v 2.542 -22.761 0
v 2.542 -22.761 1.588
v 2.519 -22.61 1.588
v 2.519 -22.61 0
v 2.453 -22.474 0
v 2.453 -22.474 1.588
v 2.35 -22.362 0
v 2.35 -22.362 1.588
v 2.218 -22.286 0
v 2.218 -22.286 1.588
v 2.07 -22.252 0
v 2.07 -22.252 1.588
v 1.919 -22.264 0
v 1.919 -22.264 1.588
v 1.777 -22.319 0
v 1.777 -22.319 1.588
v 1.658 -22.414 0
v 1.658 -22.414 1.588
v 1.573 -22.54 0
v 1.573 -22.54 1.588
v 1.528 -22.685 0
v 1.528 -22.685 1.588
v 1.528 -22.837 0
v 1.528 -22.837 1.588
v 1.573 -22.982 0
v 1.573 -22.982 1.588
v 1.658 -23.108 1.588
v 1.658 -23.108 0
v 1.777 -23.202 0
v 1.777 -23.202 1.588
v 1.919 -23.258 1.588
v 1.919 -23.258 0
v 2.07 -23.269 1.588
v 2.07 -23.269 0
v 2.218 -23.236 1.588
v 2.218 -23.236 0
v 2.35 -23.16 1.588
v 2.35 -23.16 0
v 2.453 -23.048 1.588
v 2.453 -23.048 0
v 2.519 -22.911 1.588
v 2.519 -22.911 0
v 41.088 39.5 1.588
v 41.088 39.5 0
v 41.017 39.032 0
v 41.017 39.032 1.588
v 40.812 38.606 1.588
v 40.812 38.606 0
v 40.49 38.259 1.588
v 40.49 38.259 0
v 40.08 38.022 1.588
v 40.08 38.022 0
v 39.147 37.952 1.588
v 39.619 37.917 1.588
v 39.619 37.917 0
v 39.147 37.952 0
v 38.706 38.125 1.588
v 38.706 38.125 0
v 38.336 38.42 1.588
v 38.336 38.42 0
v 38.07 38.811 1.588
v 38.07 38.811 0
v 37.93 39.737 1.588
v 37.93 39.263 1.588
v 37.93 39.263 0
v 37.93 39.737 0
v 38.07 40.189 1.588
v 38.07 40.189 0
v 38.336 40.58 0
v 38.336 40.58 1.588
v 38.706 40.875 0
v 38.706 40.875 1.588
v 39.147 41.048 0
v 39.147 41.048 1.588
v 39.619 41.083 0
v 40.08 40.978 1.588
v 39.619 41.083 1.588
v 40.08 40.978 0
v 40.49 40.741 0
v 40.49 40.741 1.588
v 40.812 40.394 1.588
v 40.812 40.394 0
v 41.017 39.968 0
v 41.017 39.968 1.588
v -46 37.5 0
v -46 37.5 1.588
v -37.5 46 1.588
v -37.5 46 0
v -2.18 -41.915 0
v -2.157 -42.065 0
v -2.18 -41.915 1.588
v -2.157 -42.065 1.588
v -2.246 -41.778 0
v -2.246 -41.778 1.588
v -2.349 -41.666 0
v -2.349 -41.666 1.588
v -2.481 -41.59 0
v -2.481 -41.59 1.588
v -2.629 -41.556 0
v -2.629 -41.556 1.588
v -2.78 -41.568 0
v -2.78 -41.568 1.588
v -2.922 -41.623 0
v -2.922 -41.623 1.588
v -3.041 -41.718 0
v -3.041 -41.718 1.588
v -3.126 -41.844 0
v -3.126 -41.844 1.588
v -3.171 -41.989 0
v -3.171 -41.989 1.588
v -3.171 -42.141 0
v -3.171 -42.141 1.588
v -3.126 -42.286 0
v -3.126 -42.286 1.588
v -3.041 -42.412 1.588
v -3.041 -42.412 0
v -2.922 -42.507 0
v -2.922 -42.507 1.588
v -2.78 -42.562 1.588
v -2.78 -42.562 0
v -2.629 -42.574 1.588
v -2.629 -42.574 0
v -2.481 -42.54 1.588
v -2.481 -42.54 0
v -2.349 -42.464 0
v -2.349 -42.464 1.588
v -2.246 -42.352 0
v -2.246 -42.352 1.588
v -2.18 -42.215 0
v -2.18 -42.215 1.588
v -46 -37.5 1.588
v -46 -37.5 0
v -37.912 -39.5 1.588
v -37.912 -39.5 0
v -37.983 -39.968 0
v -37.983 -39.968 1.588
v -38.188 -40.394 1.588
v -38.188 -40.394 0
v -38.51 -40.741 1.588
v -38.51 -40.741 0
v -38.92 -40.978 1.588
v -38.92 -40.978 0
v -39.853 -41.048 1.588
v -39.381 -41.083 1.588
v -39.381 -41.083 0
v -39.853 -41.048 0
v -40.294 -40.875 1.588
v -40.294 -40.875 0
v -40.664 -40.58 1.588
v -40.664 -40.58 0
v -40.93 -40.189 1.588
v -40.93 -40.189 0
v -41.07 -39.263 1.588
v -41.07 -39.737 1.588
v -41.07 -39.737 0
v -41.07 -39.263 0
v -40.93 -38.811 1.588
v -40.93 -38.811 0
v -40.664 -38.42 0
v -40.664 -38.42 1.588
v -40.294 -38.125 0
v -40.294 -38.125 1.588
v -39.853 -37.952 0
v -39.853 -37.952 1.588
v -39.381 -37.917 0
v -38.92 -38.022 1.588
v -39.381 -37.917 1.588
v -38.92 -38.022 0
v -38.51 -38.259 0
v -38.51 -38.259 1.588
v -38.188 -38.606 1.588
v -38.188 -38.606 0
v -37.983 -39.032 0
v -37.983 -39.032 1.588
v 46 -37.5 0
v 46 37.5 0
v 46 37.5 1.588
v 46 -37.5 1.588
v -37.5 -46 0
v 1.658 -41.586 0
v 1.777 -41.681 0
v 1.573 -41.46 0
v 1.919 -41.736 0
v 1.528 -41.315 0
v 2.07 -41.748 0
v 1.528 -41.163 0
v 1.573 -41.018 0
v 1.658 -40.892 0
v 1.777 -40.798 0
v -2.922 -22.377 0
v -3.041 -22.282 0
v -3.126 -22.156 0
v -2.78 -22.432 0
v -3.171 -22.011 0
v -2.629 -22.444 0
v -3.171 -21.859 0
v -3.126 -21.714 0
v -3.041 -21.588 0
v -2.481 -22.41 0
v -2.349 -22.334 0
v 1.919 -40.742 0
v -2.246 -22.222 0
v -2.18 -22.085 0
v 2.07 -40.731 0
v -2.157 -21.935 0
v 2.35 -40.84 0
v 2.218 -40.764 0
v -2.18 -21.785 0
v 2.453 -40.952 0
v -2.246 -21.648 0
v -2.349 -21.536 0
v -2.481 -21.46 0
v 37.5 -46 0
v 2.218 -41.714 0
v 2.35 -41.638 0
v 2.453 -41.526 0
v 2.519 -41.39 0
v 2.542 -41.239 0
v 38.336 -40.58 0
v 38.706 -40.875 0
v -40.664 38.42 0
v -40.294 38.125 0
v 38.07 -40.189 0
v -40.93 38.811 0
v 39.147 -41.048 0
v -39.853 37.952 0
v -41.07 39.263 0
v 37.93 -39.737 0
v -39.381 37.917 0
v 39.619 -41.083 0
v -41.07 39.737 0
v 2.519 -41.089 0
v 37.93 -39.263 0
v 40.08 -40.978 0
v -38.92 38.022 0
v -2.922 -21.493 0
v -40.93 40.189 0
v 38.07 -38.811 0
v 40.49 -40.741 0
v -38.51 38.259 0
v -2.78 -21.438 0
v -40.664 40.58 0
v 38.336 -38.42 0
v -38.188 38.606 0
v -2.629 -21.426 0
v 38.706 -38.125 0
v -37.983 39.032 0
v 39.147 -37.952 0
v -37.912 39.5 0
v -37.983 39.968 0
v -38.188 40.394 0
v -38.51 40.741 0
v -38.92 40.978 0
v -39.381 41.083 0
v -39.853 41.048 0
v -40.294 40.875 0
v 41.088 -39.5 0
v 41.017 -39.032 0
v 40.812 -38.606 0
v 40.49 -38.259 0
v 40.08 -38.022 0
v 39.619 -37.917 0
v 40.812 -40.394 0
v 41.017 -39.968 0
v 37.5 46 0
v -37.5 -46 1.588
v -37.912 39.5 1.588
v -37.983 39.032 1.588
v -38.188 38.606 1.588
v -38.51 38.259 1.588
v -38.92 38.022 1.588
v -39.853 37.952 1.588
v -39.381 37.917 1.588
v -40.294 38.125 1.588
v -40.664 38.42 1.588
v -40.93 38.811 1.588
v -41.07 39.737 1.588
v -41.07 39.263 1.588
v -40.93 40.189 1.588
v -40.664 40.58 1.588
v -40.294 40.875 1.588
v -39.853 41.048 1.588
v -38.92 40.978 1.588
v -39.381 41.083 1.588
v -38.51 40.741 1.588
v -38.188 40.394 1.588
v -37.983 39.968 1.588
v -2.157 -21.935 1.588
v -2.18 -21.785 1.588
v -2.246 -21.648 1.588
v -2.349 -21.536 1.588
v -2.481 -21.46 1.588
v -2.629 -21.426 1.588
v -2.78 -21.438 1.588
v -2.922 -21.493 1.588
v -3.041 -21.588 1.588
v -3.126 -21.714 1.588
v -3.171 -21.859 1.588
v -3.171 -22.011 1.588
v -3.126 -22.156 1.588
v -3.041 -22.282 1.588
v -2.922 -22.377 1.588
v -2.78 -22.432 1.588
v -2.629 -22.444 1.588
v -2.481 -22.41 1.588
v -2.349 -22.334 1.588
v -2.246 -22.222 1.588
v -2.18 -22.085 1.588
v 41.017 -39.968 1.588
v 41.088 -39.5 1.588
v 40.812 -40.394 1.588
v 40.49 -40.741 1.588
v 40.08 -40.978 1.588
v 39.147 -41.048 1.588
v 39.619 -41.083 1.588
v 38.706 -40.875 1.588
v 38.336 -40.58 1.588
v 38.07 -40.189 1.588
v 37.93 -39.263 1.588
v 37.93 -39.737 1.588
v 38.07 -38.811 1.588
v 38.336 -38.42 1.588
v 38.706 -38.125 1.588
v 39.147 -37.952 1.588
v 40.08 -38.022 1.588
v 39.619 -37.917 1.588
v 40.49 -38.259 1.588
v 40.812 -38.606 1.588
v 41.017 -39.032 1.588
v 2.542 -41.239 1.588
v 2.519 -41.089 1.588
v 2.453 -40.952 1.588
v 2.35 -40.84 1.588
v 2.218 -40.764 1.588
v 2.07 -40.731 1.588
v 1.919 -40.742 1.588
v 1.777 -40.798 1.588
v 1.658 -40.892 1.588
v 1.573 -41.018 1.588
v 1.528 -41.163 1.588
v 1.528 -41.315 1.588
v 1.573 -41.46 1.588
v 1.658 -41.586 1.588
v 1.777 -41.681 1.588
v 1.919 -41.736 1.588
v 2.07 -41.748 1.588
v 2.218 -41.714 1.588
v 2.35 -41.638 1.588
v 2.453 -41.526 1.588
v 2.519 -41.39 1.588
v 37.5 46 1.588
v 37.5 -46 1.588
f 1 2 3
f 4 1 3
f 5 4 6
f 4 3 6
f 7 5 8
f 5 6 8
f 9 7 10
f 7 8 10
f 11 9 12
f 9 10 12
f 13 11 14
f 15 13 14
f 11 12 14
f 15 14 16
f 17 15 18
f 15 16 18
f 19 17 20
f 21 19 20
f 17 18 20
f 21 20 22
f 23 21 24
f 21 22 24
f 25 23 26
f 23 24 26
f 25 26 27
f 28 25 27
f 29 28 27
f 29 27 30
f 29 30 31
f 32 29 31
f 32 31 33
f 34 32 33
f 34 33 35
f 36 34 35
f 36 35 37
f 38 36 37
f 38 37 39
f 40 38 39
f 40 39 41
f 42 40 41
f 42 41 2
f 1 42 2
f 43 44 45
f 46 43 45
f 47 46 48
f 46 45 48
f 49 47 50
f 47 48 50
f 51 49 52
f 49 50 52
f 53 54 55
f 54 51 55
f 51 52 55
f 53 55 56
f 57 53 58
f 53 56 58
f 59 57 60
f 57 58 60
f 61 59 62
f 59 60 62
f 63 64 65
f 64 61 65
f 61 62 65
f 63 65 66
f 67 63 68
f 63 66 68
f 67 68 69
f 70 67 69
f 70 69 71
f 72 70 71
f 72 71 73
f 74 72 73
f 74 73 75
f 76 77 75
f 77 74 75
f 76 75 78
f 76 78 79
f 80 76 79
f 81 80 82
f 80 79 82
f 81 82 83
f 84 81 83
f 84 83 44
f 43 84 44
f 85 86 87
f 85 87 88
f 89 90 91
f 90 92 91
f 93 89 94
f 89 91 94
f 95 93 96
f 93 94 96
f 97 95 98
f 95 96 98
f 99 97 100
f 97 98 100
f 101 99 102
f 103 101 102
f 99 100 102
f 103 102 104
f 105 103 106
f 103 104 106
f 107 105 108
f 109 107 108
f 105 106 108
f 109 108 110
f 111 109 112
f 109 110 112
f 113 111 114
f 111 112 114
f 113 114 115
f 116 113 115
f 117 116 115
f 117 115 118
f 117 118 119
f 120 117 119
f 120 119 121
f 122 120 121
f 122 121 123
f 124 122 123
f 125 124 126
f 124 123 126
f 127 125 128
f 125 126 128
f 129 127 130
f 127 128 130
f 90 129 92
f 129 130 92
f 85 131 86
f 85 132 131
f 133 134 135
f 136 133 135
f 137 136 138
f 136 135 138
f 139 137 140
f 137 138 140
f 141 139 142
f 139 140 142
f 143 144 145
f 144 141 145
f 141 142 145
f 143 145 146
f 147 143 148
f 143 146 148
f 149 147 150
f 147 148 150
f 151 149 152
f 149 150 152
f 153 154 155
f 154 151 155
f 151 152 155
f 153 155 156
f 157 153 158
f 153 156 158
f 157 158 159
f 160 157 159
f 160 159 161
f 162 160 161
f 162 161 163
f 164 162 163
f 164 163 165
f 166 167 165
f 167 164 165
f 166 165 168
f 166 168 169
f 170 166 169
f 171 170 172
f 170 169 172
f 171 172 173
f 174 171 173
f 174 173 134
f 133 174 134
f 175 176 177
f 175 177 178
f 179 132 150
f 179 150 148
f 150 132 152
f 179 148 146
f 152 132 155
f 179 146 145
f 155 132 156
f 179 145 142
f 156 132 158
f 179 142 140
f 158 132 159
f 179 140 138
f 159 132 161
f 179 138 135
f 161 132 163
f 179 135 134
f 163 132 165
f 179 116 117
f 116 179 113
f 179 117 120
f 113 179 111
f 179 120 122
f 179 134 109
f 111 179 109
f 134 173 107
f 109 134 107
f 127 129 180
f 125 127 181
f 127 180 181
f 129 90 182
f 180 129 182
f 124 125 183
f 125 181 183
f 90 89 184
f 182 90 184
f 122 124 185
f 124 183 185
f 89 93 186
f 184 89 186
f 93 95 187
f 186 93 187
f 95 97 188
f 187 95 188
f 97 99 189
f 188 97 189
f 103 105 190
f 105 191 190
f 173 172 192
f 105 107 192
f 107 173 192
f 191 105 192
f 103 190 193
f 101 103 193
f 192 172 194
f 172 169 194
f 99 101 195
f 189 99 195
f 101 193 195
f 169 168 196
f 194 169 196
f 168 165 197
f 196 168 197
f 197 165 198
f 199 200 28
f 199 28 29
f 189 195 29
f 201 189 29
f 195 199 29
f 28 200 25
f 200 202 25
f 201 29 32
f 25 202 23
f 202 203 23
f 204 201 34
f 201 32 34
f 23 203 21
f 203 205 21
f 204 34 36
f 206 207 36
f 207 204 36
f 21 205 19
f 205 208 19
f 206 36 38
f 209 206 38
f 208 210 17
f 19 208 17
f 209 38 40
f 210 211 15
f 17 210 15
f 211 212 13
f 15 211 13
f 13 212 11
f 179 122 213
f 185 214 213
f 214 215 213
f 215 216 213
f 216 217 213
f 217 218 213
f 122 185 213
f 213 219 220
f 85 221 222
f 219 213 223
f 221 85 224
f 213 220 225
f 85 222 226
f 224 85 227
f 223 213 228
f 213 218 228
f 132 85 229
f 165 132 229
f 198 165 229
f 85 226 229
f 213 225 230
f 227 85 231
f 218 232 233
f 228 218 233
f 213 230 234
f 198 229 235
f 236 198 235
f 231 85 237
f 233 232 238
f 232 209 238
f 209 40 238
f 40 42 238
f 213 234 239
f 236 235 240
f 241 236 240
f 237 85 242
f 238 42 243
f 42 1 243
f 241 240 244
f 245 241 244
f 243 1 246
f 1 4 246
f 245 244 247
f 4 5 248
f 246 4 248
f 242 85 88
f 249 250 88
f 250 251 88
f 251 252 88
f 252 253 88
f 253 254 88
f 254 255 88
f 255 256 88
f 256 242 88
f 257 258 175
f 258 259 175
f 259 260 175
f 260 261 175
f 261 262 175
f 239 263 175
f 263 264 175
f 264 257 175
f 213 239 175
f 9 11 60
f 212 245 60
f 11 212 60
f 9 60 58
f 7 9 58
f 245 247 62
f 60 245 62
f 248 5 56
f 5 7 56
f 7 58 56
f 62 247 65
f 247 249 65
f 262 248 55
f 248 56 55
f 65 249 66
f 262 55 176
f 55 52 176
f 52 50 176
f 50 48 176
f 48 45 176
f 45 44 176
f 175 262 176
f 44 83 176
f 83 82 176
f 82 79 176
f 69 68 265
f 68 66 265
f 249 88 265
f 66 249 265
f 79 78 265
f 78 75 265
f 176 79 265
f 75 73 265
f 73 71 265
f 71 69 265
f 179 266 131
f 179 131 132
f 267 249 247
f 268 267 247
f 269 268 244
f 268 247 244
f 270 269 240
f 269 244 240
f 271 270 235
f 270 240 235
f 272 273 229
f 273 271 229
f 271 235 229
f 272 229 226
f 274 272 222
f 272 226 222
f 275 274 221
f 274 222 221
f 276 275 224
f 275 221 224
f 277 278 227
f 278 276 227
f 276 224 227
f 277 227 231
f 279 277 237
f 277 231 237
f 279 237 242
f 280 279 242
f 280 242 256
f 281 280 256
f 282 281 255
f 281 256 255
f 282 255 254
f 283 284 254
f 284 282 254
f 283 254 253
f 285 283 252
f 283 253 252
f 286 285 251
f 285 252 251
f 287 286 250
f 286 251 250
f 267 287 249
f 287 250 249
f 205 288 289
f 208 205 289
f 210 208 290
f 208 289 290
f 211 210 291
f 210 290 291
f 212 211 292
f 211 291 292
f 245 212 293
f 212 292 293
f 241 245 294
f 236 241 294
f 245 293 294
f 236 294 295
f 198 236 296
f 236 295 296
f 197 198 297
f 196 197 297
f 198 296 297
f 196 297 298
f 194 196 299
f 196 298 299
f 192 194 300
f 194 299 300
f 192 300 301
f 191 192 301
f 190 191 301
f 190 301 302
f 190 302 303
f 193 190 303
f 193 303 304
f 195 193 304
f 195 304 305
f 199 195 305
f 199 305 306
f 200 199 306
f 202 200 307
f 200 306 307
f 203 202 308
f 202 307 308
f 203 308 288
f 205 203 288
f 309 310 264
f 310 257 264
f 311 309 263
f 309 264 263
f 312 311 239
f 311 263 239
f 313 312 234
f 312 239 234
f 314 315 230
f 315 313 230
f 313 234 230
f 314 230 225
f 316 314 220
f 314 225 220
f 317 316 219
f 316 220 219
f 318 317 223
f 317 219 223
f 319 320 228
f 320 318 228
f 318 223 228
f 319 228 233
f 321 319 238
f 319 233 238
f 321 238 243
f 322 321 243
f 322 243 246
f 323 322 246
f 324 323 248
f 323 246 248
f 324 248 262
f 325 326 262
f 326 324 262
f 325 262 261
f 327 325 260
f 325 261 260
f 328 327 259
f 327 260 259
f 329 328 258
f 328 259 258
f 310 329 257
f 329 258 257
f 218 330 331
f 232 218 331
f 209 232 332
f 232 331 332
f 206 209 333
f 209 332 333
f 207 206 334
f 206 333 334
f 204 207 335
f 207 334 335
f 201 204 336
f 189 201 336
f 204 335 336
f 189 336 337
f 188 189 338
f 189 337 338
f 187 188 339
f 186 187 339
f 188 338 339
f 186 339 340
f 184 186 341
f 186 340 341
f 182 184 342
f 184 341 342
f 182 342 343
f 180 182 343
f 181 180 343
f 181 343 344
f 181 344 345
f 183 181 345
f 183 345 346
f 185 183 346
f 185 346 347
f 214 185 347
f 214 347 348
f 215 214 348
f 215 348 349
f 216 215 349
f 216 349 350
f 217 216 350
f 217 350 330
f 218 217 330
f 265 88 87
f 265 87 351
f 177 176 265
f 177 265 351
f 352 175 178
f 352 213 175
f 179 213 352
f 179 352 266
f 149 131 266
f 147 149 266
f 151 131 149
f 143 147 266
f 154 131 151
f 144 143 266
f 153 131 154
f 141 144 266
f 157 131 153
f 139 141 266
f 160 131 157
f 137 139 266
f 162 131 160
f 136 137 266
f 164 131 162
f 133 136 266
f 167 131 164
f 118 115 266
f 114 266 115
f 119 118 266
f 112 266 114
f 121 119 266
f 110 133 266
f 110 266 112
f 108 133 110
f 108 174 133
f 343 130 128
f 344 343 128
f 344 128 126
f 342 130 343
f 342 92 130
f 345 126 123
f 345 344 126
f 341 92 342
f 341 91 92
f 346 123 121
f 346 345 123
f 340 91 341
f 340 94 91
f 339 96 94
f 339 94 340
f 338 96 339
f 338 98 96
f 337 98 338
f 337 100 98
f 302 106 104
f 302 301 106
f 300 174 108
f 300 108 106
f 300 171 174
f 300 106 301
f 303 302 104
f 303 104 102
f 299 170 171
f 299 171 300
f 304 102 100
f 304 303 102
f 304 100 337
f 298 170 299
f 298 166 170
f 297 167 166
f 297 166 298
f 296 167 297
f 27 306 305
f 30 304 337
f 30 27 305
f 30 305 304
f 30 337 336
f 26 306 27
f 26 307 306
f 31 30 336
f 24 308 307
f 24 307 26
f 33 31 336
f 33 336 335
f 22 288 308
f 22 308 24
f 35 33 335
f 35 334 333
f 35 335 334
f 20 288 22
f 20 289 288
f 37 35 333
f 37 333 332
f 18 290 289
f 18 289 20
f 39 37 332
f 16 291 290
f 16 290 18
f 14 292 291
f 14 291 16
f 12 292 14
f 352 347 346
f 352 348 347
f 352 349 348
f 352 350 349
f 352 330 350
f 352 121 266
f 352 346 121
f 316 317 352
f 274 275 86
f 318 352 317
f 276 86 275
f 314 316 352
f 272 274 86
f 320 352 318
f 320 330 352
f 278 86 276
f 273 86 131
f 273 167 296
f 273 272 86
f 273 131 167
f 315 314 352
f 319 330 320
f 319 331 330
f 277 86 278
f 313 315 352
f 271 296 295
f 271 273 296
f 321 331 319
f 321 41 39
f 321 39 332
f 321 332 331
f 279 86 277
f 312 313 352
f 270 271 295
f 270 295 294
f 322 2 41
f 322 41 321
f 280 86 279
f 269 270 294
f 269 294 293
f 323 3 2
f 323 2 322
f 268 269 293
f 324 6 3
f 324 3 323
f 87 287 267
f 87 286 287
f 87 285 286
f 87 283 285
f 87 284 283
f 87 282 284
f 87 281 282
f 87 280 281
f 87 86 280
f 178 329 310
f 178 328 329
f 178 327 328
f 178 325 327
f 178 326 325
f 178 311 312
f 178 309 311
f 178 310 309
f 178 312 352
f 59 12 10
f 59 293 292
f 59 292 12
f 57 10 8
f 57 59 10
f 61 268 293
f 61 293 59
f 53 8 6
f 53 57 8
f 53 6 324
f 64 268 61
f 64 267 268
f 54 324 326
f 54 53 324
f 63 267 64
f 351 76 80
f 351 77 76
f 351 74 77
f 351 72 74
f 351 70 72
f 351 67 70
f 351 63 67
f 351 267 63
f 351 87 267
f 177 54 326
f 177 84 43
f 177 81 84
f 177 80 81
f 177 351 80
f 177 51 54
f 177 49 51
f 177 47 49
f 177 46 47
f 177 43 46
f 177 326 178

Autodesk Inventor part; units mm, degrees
sketch "Sketch1" plane through (0, 0, 0) normal (0, 0, 1) x (1, 0, 0)
  line L0 (-46, 46) -> (46, 46)
  line L1 (46, 46) -> (46, -46)
  line L2 (46, -46) -> (-46, -46)
  line L3 (-46, -46) -> (-46, 46)
  circle A0 centre (39.5, 39.5) radius 1.5875
  circle A1 centre (-39.5, 39.5) radius 1.5875
  circle A2 centre (-39.5, -39.5) radius 1.5875
  circle A3 centre (39.5, -39.5) radius 1.5875
  line L4 (0, 10.5587) -> (0, 0)
  line L5 (0, 0) -> (12.3531, 0)
  circle A4 centre (-39.5, 39.5) radius 3.175 construction
  line L6 (-38, 44.6281) -> (-38, 37.8613) construction
  dimension "d0" = 92
  dimension "d1" = 92
  dimension "d508" = 3.175
  dimension "d509" = 79
  dimension "d510" = 79
  dimension "d511" = 6.35
  dimension "d515" = 76
extrude "Extrusion1" add sketch "Sketch1" along normal blind 1.5875
ref_plane "Work Plane_ConnX" through (-32, 0, 0) normal (1, 0, 0) x (0, 1, 0)
ref_plane "Work Plane_ConnY" through (0, 0, 0) normal (0, 1, 0) x (-1, 0, 0)
sketch "Sketch9" plane through (0, 0, 1.5875) normal (0, 0, 1) x (1, 0, 0)
  line L0 (46, 46) -> (46, -46) projected
  line L1 (58.5598, -32) -> (-58.5598, -32)
  circle A0 centre (-2.667, -21.935) radius 0.51
  circle A1 centre (-2.667, -42.065) radius 0.51
  line L2 (0, 26.5598) -> (0, -90.5598) construction
  point P0 (0, 0)
  point P1 (0, -32)
  dimension "d134" = 20.13
  dimension "d136" = 2.667
  dimension "d138" = 1.02
  dimension "d141" = 180
  dimension "d350" = 32
  dimension "d351" = 0
extrude "Holes_Conn_Zminus" cut sketch "Sketch9" against normal through all
sketch "Sketch22" plane through (0, 0, 1.5875) normal (0, 0, 1) x (1, 0, 0)
  line L0 (46, 46) -> (46, -46) projected
  line L1 (0, -1.0026) -> (0, -62.9974) construction
  line L2 (62.8115, -32) -> (-62.8115, -32)
  circle A0 centre (2.032, -22.7608) radius 0.51
  circle A1 centre (2.032, -41.2392) radius 0.51
  point P0 (46, -35)
  point P1 (46, 35)
  point P2 (0, 0)
  point P3 (0, -32)
  dimension "d282" = 180
  dimension "d283" = 18.4785
  dimension "d284" = 1.02
  dimension "d285" = 2.032
  dimension "d352" = 32
  dimension "d353" = 0
extrude "Holes_Conn_Zplus" cut sketch "Sketch22" against normal through all
chamfer "Chamfer4" distance 8.5 angle 45 4 edges at (-46, 46, 0.7937) (46, 46, 0.7937) (46, -46, 0.7937) (-46, -46, 0.7937)
sketch "Sketch31" plane through (0, 0, 1.5875) normal (0, 0, 1) x (1, 0, 0)
  circle A0 centre (39.5, -39.5) radius 3.175
  circle A1 centre (39.5, 39.5) radius 3.175
  circle A2 centre (-39.5, 39.5) radius 3.175
  circle A3 centre (-39.5, -39.5) radius 3.175
  point P0 (0, 0)
  dimension "d287" = 0
  dimension "d516" = 6.35
sketch "Sketch32" plane through (0, 0, 1.5875) normal (0, 0, 1) x (1, 0, 0)
  line L0 (34, -46) -> (34, -37.2218)
  line L1 (34, -37.2218) -> (37.2218, -34)
  line L2 (37.2218, -34) -> (46, -34)
  line L3 (46, 34) -> (37.2218, 34)
  line L4 (37.2218, 34) -> (34, 37.2218)
  line L5 (34, 37.2218) -> (34, 46)
  line L6 (-34, 46) -> (-34, 37.2218)
  line L7 (-34, 37.2218) -> (-37.2218, 34)
  line L8 (-37.2218, 34) -> (-46, 34)
  line L9 (-34, -46) -> (-34, -37.2218)
  line L10 (-34, -37.2218) -> (-37.2218, -34)
  line L11 (-37.2218, -34) -> (-46, -34)
  point P0 (39.5, -39.5)
  point P1 (0, 0)
  dimension "d287" = 0
  dimension "d519" = 5.5
  dimension "d520" = 5.5
sketch "Sketch34" plane through (0, 0, 1.5875) normal (0, 0, 1) x (1, 0, 0)
  line L0 (37.5, -46) -> (-37.5, -46) projected
  line L1 (46, 37.5) -> (46, -37.5) projected
  line L2 (-37.5, 46) -> (37.5, 46) projected
  line L3 (-46, -37.5) -> (-46, 37.5) projected
  line L4 (-46, 46) -> (46, 46) construction
  line L5 (46, 46) -> (46, -46) construction
  line L6 (46, -46) -> (-46, -46) construction
  line L7 (-46, -46) -> (-46, 46) construction
  point P0 (0, 0)
decal "Decal4"
sketch "Sketch35" plane through (0, 0, 0) normal (0, 0, -1) x (-1, 0, 0)
  line L0 (46, -37.5) -> (46, 37.5) projected
  line L1 (37.5, 46) -> (-37.5, 46) projected
  line L2 (-46, 37.5) -> (-46, -37.5) projected
  line L3 (-37.5, -46) -> (37.5, -46) projected
  line L4 (-46, 46) -> (46, 46) construction
  line L5 (46, 46) -> (46, -46) construction
  line L6 (46, -46) -> (-46, -46) construction
  line L7 (-46, -46) -> (-46, 46) construction
  point P0 (0, 0)
decal "Decal5"
sketch "Sketch36" plane through (0, 0, 1.5875) normal (0, 0, 1) x (1, 0, 0)
  line L0 (-37.5, 46) -> (37.5, 46) projected
  line L1 (37.5, -46) -> (-37.5, -46) projected
  line L2 (-46, -37.5) -> (-46, 37.5) projected
  line L3 (46, 37.5) -> (46, -37.5) projected
  point P0 (0, 0)
  point P1 (0, 46)
  point P2 (0, -46)
  point P3 (-46, 0)
  point P4 (46, 0)
ref_plane "Work Plane13" through (0, 46, 1.5875) normal (1, 0, 0) x (0, -1, 0)
ref_plane "Work Plane14" through (-46, 0, 1.5875) normal (0, 1, 0) x (1, 0, 0)
properties part number "PCB_RT-IHU" material "FR4"
